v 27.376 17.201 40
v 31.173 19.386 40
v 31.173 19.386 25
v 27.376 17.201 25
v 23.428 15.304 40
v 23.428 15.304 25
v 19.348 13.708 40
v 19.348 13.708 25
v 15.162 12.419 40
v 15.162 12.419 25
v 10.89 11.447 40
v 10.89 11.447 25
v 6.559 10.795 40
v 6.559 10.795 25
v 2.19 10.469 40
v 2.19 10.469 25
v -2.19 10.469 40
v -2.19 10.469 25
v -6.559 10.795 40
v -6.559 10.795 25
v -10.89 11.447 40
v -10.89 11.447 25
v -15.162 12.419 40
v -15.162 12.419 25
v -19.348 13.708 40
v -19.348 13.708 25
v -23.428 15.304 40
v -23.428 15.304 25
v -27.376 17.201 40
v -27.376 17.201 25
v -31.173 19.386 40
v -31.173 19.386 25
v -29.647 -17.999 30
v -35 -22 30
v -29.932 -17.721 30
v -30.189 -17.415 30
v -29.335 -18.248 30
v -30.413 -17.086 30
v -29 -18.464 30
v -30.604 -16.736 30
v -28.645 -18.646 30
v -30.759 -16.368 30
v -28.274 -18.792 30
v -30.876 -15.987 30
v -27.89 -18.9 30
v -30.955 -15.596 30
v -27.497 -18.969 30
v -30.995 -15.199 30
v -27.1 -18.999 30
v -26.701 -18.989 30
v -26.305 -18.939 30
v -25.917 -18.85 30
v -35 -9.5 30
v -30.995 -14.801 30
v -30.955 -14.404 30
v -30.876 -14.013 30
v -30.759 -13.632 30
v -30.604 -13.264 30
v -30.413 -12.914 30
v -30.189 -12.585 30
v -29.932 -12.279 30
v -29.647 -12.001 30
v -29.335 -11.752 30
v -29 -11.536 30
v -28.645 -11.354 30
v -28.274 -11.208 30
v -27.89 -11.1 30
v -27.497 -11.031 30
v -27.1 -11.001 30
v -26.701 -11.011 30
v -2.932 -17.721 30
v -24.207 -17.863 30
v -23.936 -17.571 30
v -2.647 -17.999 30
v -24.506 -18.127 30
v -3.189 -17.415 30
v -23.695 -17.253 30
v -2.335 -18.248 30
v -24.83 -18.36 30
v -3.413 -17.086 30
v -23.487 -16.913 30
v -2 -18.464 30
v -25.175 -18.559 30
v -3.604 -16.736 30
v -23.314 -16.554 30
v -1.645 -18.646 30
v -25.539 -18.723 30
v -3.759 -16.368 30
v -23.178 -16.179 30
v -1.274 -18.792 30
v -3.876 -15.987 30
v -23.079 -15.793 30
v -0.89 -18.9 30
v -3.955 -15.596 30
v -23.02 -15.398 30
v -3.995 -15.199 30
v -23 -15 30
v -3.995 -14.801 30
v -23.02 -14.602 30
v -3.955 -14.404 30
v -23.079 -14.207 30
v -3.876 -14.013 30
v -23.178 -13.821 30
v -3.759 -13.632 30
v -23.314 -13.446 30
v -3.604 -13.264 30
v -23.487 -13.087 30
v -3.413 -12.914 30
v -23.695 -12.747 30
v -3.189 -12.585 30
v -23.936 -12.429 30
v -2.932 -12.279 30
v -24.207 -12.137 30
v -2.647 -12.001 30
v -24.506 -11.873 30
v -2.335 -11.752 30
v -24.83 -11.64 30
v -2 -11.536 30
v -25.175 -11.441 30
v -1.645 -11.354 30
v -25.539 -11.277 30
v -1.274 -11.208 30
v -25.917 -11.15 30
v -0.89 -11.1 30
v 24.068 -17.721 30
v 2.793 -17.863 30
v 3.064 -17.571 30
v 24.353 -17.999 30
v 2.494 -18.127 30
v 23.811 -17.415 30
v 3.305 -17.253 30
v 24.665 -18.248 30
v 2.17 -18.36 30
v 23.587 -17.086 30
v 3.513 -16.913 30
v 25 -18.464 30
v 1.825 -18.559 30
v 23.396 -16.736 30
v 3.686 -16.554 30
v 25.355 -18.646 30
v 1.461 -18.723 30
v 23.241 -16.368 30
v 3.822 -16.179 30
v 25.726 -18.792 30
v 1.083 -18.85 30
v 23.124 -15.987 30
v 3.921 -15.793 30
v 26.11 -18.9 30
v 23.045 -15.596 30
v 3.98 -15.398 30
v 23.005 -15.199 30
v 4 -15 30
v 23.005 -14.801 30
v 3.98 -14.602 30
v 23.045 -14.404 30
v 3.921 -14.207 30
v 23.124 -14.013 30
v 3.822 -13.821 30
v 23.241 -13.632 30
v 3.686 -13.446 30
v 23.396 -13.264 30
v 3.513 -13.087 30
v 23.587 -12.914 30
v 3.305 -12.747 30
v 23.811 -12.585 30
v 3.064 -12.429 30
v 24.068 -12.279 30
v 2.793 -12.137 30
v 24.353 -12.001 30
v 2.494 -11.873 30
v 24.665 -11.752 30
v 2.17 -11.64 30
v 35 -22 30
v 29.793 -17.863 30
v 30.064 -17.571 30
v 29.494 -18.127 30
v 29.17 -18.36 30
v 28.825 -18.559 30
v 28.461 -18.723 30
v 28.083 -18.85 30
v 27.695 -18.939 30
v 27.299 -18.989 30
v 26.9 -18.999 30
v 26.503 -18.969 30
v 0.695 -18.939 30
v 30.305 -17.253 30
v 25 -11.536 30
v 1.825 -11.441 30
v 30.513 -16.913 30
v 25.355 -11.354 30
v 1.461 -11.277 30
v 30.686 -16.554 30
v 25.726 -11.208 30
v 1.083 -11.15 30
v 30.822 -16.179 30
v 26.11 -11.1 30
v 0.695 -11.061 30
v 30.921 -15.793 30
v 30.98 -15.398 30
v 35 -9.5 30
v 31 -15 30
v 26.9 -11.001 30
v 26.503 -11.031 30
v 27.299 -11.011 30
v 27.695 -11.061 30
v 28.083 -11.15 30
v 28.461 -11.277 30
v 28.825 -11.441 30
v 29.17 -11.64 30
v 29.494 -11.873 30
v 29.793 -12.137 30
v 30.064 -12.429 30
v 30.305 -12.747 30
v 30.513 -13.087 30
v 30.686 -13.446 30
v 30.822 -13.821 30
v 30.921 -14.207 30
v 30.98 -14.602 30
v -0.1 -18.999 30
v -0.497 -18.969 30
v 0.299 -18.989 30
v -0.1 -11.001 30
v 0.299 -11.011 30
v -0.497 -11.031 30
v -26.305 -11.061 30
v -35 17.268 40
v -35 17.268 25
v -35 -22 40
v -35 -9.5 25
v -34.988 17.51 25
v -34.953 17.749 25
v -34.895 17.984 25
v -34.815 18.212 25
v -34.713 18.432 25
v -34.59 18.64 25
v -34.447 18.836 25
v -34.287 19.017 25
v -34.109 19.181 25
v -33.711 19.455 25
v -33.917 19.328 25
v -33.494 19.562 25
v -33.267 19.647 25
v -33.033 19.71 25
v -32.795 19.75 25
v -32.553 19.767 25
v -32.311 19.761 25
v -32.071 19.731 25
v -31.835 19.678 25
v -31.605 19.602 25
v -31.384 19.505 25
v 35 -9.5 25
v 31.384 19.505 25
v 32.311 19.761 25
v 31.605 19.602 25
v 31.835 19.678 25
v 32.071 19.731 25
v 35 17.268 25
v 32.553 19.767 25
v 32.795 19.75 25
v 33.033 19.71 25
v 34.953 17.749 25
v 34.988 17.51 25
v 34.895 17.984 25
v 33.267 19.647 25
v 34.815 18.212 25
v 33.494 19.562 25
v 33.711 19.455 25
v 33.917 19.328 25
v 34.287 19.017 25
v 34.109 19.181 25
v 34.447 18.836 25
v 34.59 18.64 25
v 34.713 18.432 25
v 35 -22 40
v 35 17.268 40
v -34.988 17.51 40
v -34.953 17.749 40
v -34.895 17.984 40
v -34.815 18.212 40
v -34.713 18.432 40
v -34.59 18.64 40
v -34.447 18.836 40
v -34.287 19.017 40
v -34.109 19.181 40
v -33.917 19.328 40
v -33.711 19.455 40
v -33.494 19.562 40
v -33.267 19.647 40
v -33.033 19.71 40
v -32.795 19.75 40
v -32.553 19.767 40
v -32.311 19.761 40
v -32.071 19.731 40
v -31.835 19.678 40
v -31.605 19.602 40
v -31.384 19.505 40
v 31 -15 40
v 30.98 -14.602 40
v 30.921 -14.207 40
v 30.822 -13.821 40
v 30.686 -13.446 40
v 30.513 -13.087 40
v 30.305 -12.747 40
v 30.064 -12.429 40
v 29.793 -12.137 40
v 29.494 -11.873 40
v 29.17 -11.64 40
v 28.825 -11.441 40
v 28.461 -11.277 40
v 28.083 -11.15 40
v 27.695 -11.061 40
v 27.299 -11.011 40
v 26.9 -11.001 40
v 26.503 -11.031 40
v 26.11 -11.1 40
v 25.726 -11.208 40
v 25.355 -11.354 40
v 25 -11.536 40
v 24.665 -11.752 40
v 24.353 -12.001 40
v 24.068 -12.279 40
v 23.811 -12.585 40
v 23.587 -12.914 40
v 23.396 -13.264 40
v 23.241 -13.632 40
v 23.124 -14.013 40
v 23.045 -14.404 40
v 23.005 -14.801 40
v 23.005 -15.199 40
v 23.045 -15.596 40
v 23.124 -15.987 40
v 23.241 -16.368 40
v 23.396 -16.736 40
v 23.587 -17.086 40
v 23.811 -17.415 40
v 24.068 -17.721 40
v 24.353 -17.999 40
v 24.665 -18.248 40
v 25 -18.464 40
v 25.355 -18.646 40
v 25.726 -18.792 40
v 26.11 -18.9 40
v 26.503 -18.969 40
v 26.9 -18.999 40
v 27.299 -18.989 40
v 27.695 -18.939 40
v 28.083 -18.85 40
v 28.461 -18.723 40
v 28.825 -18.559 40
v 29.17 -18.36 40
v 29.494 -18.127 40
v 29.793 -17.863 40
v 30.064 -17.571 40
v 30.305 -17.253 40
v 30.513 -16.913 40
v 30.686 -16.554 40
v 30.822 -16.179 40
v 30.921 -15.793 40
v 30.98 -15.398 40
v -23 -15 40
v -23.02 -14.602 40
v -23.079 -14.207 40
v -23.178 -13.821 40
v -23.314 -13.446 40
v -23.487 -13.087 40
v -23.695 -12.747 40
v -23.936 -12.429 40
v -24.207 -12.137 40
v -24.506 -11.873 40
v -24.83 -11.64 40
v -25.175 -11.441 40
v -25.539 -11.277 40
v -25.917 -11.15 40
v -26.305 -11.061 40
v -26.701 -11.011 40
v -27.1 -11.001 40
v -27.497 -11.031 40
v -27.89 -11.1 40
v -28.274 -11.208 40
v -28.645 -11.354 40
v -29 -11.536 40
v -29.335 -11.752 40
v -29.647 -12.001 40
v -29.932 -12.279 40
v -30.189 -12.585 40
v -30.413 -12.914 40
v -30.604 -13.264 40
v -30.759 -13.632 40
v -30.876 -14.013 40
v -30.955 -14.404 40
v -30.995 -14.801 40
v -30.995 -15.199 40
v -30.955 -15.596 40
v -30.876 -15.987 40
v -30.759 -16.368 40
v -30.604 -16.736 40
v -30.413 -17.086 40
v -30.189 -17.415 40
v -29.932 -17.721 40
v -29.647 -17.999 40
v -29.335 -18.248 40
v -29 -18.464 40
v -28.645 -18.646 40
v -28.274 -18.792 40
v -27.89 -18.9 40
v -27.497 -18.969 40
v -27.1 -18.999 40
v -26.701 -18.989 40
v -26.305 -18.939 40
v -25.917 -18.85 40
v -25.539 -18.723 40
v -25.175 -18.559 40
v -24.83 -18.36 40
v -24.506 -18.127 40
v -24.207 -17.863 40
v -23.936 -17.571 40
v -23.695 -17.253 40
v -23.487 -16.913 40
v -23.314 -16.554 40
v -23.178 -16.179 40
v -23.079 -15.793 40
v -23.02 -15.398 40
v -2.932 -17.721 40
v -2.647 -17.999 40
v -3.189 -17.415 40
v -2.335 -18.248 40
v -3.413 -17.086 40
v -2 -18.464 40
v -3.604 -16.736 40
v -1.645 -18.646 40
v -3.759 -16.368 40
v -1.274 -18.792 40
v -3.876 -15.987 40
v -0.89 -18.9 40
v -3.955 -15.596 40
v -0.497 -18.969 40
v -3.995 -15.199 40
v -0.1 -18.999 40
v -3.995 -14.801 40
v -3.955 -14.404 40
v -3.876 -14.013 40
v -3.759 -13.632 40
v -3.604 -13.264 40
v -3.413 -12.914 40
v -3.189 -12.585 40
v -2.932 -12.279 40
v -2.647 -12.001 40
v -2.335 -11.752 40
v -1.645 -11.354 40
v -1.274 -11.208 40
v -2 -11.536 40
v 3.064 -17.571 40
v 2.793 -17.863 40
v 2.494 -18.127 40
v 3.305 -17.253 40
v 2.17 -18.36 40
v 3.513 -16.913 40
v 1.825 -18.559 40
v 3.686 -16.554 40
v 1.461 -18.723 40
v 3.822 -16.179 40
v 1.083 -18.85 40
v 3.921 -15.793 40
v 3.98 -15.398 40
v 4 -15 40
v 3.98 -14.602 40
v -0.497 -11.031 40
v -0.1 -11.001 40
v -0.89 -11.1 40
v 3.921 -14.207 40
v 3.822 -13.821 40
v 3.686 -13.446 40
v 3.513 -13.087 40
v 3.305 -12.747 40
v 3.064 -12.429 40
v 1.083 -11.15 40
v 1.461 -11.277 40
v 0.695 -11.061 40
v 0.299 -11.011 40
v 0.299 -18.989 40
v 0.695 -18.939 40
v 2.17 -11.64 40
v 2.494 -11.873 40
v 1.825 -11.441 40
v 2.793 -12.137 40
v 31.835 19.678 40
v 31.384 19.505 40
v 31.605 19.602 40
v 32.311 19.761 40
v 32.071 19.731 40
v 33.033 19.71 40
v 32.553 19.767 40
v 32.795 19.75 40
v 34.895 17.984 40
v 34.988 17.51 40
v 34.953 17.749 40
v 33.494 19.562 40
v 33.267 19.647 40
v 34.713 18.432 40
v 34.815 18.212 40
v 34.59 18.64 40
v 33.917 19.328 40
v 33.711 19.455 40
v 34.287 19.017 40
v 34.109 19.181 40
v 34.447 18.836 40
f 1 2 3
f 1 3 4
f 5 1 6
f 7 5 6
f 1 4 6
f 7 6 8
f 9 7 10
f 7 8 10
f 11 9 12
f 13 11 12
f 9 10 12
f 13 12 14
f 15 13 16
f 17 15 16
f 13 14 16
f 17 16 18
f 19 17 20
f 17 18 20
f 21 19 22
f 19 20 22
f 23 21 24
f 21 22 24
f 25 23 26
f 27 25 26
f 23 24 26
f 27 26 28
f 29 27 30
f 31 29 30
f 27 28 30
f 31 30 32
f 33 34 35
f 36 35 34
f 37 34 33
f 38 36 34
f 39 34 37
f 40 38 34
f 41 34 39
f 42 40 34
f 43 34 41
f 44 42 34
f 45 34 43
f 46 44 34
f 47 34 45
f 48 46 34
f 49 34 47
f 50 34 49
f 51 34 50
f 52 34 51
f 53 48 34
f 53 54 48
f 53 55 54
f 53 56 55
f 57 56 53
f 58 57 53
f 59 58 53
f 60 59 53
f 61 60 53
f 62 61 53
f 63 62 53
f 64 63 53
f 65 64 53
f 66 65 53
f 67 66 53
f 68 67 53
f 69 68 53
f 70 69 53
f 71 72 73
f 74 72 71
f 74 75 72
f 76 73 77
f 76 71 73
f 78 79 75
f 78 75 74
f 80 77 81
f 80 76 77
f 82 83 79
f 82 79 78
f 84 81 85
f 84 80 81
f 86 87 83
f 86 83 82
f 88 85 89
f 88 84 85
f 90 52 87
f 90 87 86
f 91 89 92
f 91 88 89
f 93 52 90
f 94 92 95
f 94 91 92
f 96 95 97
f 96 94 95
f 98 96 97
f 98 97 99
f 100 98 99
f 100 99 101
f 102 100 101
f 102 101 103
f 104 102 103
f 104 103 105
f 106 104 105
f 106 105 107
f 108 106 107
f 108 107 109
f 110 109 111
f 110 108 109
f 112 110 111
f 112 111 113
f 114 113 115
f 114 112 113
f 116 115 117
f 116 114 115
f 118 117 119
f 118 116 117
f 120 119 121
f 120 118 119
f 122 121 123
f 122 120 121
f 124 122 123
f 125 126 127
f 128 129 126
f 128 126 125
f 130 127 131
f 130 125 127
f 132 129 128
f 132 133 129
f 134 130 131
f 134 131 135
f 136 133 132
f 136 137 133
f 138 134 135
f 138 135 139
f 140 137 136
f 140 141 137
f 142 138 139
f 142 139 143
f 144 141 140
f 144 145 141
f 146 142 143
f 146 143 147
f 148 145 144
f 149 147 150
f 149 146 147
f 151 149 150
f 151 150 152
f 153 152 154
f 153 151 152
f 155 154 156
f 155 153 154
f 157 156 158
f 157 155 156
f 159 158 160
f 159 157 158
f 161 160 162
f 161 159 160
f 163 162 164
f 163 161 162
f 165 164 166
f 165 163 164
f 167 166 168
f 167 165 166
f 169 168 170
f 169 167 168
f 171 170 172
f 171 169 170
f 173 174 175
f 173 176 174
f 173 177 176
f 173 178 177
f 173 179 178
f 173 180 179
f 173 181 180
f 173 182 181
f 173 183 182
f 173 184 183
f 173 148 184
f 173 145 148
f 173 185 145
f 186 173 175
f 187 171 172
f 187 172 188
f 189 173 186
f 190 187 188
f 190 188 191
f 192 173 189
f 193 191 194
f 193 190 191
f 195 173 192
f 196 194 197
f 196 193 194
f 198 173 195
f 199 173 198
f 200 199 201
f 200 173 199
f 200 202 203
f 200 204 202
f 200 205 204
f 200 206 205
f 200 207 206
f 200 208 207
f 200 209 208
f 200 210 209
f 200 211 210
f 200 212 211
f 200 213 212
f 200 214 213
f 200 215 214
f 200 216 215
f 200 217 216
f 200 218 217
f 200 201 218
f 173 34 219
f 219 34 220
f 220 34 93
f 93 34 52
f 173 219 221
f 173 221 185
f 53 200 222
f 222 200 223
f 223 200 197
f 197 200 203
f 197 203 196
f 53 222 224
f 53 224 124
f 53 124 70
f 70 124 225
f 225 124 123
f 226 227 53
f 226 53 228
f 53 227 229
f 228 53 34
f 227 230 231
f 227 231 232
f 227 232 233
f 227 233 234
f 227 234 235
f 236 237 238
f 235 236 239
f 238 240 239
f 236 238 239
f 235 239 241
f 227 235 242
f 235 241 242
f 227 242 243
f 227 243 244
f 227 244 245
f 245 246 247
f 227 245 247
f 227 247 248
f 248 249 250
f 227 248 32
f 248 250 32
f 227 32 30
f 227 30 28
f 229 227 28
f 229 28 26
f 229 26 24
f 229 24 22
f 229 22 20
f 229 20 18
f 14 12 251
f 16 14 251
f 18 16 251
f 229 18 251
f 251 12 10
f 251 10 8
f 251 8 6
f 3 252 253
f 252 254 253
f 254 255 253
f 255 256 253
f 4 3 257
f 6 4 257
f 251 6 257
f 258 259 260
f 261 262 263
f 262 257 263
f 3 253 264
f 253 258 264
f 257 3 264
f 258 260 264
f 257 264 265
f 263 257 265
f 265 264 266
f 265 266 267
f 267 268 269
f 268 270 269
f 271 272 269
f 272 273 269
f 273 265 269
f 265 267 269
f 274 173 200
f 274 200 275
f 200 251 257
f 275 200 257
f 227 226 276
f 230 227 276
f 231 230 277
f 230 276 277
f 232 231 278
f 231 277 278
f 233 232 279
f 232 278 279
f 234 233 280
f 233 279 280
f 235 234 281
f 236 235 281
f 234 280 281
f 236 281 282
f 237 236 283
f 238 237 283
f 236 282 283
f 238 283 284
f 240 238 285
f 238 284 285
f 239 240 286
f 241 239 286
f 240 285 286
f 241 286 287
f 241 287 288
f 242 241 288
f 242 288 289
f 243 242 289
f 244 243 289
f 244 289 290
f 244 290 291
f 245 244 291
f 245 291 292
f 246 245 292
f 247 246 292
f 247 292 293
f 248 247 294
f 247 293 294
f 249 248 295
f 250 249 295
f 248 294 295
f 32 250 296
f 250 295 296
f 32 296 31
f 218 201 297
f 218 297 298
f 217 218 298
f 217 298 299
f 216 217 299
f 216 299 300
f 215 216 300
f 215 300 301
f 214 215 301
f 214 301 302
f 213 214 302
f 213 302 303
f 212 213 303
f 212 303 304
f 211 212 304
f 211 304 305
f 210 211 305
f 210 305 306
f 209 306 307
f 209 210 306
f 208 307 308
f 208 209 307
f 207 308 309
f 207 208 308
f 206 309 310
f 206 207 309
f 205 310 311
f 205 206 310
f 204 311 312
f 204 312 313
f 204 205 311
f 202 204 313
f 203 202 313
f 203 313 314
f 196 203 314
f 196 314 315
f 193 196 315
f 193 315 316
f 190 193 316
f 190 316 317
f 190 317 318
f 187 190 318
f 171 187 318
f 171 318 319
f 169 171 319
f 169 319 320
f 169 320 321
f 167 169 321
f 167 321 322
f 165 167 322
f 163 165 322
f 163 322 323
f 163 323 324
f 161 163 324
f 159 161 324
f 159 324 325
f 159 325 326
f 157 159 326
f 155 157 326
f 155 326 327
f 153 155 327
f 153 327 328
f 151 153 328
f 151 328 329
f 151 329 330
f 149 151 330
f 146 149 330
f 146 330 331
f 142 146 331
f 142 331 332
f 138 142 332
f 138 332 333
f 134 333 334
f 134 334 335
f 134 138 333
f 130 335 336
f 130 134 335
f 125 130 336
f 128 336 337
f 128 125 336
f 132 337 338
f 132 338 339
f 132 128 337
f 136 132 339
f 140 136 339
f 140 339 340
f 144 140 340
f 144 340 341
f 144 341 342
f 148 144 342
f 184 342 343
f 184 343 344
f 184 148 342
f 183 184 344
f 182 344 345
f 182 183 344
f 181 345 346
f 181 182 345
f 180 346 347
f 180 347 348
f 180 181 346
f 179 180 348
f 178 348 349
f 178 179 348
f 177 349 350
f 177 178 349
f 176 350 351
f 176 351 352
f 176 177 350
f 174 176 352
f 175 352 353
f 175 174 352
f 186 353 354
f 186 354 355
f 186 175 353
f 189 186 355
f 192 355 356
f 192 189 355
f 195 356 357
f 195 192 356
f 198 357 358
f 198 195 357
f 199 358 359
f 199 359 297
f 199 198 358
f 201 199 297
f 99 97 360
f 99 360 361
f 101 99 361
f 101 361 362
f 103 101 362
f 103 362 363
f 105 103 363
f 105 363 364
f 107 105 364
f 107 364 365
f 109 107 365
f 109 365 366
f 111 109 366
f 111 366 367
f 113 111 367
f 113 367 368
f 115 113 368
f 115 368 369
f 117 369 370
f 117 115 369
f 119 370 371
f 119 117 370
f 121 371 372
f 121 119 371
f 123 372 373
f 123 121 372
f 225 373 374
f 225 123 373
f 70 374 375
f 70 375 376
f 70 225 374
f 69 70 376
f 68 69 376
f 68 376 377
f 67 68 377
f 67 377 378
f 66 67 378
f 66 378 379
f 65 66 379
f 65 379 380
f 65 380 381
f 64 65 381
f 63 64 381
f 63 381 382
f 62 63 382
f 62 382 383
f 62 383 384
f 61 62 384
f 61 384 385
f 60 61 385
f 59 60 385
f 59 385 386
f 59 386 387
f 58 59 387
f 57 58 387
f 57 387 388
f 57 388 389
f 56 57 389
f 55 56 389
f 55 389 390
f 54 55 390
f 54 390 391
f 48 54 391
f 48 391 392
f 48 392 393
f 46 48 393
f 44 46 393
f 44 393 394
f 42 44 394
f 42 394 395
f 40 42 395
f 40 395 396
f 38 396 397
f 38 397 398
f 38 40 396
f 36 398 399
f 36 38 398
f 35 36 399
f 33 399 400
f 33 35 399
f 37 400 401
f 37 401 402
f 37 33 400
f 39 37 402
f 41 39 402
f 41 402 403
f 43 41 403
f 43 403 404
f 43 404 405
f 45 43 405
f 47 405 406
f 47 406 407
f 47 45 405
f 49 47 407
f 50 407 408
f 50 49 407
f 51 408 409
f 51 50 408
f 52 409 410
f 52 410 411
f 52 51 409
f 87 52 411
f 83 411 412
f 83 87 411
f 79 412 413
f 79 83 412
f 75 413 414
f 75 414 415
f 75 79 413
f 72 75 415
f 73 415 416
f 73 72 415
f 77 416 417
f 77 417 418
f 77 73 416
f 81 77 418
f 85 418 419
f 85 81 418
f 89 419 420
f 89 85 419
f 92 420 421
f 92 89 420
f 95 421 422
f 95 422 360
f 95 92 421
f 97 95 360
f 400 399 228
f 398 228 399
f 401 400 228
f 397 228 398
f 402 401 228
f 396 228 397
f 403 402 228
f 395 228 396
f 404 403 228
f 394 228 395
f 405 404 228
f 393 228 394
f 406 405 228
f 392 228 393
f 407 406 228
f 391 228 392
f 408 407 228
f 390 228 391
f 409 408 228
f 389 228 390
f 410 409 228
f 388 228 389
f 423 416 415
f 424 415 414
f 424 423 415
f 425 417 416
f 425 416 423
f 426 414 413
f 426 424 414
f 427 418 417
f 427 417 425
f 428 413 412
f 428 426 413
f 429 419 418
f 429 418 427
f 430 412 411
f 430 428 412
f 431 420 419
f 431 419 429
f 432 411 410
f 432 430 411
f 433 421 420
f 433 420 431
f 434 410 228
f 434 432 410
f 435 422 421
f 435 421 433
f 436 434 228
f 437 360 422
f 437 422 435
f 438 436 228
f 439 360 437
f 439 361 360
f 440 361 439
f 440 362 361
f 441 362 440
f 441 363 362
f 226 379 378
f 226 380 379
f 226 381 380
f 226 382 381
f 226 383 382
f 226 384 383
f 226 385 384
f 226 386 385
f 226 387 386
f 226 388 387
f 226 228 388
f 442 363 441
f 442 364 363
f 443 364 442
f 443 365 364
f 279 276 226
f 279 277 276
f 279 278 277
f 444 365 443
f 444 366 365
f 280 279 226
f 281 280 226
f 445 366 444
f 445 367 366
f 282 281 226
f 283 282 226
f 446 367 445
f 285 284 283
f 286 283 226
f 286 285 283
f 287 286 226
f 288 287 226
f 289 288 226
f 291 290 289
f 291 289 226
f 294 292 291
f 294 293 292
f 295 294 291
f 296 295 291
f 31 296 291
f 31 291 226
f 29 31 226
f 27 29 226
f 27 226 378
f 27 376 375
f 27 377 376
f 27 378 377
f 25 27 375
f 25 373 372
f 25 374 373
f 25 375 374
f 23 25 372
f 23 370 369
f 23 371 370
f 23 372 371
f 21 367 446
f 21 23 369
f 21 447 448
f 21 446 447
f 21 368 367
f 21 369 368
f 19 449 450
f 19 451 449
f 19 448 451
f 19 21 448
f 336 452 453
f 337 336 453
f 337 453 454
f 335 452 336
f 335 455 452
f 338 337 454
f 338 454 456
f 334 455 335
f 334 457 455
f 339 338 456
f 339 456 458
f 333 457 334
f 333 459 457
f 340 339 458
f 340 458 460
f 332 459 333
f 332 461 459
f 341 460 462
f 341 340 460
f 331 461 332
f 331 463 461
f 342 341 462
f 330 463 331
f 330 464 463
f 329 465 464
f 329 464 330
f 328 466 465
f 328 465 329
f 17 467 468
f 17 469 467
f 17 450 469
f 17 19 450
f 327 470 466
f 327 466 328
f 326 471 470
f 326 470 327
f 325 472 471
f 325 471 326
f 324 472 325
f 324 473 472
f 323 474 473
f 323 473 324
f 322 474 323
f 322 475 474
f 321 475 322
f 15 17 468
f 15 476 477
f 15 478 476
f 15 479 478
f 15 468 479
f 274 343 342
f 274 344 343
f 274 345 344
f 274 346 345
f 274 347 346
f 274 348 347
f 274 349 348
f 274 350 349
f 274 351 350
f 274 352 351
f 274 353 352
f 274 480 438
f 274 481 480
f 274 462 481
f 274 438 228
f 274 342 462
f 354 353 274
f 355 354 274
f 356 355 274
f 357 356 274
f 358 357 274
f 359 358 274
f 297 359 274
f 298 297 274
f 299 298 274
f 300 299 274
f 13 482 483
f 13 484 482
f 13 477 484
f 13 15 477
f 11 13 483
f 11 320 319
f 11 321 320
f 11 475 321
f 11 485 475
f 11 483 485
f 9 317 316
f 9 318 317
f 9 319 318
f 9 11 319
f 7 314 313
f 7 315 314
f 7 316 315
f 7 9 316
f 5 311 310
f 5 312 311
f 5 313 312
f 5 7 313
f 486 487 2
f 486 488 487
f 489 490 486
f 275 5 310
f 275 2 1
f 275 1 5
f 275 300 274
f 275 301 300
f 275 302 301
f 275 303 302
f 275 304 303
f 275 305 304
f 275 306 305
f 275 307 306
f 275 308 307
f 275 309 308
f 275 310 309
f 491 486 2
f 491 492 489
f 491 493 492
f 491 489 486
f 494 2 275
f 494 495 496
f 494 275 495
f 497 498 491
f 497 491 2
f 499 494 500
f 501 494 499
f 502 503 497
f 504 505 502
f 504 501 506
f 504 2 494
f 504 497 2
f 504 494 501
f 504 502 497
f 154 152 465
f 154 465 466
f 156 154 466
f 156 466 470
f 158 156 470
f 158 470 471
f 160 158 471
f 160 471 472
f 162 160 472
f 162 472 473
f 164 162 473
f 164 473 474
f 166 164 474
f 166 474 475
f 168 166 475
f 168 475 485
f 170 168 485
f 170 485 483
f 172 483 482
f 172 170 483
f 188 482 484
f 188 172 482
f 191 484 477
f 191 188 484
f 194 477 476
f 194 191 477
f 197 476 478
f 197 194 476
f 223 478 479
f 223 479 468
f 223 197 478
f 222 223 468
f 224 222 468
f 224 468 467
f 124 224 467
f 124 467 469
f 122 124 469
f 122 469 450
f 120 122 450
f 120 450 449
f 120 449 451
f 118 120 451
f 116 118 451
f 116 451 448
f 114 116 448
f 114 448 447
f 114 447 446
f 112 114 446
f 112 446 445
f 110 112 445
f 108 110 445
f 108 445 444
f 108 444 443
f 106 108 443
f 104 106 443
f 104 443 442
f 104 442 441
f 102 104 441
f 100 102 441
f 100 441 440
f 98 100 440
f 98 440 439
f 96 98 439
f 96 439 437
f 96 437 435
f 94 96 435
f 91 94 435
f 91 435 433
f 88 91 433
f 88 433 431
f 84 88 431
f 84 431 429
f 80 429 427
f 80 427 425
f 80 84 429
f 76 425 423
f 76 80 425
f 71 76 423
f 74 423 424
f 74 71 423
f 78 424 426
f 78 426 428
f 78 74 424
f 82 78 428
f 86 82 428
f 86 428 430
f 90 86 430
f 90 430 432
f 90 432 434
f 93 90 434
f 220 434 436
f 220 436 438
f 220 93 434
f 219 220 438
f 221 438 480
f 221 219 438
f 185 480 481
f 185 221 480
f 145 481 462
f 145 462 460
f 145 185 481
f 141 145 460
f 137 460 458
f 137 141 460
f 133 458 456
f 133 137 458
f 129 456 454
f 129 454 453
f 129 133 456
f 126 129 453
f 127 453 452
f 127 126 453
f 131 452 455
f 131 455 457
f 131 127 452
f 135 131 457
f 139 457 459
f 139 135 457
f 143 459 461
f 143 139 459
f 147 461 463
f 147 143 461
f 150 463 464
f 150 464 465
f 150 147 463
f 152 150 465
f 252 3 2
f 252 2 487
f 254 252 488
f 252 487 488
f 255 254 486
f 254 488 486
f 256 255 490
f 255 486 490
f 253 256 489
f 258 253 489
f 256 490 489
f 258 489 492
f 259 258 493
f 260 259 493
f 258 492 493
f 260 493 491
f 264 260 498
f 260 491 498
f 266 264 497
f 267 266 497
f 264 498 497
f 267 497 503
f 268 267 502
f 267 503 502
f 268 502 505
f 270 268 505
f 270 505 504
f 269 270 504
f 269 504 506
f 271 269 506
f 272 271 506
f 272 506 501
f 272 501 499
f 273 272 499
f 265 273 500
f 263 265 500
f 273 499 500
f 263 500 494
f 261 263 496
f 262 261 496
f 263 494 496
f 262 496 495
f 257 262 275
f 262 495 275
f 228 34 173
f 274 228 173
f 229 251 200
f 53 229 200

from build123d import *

# Parameters (mm, degrees)
F0_R     = 4
F1_DEPTH = 40
F2_W     = 12.5
F2_H     = 30
F3_DEPTH = 70
F4_R     = 2.5
F5_DEPTH = 25


with BuildPart() as f1:
    # F0 (on Top) → F1 (new body)
    with BuildSketch(Plane.XY):
        with BuildLine():
            Line((-35, 22), (-35, -22))
            Line((-35, -22), (35, -22))
            Line((35, -22), (35, 22))
            ThreePointArc((35, 22), (0, 10.4279927909), (-35, 22))
        make_face()
        with Locations((-27, -15)):
            Circle(F0_R, mode=Mode.SUBTRACT)
        with Locations((0, -15)):
            Circle(F0_R, mode=Mode.SUBTRACT)
        with Locations((27, -15)):
            Circle(F0_R, mode=Mode.SUBTRACT)
    extrude(amount=F1_DEPTH)

    # F2 (on face) → F3 (cut)
    with BuildSketch(Plane.YZ.offset(35)):
        with Locations((-15.75, 15)):
            Rectangle(F2_W, F2_H)
    extrude(amount=-F3_DEPTH, mode=Mode.SUBTRACT)

    # F4
    f4_edges = [f1.edges().sort_by_distance(p)[0] for p in [
        (35, 22, 20),
        (-35, 22, 20),
    ]]
    fillet(f4_edges, radius=F4_R)

    # F5 (cut): a face of the model
    f5_faces = [f1.faces().sort_by_distance(p)[0] for p in [
        (0, 2.4481548638, 0),
    ]]
    extrude(f5_faces, amount=-F5_DEPTH, mode=Mode.SUBTRACT)


solid = f1.part
